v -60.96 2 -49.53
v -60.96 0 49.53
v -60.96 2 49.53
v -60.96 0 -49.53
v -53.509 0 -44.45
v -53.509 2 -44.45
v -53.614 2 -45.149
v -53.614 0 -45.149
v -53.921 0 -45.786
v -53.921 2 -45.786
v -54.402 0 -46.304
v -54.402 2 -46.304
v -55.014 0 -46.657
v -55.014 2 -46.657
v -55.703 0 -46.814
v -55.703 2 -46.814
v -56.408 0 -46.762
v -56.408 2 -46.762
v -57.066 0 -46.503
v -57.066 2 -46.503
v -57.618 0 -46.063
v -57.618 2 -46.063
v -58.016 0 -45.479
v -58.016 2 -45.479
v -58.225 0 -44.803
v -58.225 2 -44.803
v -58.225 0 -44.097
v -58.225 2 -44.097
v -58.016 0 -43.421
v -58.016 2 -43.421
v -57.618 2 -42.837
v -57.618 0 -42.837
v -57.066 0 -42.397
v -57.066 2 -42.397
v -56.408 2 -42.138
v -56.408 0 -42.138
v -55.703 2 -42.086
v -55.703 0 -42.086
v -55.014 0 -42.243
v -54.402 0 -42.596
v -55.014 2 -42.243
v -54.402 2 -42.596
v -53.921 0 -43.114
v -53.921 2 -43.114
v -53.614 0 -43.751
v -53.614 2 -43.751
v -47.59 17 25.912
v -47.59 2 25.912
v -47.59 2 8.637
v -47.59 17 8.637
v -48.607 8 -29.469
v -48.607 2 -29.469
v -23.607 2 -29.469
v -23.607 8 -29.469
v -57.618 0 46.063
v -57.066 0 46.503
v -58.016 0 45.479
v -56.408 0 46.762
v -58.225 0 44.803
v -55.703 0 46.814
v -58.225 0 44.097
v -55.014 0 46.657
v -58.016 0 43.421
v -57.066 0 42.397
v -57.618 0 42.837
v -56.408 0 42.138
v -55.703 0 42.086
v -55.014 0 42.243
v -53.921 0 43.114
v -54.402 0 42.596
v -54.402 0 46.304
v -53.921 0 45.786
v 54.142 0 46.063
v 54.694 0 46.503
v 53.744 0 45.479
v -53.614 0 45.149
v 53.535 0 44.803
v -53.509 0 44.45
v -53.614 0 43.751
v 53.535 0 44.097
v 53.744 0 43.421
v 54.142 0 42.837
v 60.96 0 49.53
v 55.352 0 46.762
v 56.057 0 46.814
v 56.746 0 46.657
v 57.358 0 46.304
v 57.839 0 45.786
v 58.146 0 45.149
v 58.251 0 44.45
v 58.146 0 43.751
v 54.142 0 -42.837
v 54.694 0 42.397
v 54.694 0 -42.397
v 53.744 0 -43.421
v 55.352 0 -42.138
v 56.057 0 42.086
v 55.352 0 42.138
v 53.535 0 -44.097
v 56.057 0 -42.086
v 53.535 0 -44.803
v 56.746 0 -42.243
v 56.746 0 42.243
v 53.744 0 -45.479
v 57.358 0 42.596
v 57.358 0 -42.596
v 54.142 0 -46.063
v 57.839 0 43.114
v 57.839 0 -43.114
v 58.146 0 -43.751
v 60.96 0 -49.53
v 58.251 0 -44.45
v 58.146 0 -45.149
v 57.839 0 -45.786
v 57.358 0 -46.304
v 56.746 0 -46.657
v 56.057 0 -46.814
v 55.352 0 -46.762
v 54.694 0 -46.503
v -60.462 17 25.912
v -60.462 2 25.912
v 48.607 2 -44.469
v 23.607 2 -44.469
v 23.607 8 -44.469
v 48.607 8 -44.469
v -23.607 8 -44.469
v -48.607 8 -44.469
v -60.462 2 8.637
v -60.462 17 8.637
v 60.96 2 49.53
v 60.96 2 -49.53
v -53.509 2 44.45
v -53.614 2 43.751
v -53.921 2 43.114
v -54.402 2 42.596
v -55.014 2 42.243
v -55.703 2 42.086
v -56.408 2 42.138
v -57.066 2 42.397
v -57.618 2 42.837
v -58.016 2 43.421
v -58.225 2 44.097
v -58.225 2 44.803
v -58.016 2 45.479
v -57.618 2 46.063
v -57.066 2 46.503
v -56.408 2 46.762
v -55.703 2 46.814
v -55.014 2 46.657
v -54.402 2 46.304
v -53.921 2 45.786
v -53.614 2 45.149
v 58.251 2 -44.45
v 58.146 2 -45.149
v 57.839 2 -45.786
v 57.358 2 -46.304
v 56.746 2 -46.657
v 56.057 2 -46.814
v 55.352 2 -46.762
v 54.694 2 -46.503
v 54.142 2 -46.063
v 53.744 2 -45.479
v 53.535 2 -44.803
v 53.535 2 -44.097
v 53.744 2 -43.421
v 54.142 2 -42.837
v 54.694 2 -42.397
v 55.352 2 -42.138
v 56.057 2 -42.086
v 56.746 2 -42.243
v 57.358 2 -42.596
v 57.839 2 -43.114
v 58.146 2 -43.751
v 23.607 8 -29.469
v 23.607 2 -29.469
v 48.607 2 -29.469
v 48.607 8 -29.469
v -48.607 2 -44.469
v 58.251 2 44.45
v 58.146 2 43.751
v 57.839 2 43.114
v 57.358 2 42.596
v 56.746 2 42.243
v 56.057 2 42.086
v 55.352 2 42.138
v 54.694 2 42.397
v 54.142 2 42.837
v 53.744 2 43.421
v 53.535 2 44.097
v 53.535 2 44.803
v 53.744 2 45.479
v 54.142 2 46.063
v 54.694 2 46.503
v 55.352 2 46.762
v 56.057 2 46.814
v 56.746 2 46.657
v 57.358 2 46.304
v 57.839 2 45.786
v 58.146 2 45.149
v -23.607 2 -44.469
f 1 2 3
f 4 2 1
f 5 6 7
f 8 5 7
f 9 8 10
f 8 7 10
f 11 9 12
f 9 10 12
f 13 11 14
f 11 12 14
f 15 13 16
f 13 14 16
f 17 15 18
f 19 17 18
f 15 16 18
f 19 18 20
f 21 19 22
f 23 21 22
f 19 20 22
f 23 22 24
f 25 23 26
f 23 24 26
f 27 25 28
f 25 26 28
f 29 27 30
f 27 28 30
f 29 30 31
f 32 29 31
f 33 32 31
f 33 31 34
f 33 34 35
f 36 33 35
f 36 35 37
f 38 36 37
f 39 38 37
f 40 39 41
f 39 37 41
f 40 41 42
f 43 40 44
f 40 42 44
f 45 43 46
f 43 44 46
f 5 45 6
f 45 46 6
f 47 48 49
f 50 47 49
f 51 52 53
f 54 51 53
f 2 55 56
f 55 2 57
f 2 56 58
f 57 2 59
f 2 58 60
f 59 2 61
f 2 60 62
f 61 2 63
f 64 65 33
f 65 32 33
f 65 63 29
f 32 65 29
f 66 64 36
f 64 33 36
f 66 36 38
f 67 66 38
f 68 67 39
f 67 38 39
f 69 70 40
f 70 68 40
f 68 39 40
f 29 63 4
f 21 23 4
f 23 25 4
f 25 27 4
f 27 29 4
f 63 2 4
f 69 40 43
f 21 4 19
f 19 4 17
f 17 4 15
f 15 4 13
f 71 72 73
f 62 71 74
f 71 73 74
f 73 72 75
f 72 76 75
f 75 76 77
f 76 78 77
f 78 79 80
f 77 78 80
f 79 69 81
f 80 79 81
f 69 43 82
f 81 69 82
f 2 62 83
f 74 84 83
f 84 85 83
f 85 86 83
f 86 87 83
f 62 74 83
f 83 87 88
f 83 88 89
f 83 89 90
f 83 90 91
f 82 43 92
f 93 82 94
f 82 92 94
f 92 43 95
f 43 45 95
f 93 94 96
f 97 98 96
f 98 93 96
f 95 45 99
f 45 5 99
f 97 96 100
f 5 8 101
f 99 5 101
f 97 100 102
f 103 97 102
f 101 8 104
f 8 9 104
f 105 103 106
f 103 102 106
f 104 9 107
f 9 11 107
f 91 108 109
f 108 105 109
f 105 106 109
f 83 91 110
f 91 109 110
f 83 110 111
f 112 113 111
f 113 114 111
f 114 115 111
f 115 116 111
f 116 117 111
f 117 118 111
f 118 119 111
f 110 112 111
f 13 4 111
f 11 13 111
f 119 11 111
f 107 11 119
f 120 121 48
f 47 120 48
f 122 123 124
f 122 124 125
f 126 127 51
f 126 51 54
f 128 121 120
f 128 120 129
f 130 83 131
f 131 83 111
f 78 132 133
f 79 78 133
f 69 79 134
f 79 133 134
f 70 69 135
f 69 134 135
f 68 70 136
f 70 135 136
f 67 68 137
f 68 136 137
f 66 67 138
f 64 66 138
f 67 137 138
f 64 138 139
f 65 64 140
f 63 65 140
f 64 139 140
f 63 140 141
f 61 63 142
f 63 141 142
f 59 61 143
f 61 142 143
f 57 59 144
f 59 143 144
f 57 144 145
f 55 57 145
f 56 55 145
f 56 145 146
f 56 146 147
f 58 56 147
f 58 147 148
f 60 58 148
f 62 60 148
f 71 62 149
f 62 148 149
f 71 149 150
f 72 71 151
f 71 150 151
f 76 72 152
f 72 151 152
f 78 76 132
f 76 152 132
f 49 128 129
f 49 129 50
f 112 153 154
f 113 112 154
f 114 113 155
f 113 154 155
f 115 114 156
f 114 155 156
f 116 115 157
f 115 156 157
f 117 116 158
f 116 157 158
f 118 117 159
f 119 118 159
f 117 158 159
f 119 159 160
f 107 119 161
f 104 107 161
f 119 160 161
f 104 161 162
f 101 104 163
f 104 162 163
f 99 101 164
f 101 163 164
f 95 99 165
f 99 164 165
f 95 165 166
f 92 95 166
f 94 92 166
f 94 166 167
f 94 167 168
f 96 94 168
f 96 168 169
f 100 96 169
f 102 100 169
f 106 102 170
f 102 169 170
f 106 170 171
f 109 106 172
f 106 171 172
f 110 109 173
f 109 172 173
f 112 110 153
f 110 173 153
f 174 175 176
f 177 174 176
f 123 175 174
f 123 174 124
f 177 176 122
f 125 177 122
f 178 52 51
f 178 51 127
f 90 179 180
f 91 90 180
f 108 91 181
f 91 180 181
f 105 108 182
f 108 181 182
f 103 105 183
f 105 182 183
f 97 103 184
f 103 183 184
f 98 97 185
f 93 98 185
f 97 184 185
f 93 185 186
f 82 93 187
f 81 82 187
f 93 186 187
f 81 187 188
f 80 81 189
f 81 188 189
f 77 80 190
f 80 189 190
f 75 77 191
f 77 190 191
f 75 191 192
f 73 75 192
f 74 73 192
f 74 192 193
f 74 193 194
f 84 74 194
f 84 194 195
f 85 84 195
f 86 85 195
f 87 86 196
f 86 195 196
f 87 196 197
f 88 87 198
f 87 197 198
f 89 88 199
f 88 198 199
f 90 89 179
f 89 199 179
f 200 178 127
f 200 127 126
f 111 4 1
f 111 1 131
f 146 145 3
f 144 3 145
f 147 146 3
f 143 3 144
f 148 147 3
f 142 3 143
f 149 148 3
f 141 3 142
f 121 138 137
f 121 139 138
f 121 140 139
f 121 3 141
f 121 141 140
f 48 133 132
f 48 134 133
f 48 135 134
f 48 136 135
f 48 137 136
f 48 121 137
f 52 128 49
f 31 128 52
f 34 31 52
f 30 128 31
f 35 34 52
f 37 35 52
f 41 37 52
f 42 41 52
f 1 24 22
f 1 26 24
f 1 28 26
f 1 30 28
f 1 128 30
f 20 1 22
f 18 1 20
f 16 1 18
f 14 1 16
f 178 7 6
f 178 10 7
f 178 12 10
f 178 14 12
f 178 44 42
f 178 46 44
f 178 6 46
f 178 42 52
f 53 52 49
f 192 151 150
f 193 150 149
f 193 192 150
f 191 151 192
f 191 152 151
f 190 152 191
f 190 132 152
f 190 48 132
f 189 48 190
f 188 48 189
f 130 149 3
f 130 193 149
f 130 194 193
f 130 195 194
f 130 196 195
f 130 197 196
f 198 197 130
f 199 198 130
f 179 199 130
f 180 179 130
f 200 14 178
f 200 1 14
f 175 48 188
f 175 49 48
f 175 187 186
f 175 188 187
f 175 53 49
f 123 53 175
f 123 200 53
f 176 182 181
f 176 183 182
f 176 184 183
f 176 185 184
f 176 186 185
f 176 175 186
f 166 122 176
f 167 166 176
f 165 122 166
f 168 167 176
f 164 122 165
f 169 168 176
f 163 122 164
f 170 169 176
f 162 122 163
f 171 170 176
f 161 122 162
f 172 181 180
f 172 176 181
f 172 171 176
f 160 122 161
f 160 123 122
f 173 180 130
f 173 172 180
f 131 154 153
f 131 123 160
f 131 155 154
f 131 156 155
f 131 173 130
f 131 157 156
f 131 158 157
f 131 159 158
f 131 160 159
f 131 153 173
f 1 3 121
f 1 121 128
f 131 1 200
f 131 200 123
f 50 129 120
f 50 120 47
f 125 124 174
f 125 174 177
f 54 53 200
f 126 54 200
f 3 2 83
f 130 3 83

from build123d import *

# Parameters (mm, degrees)
SKETCH1_W           = 121.92
SKETCH1_H           = 99.06
BOSS_EXTRUDE1_DEPTH = 2
SKETCH2_R           = 2.371054243
CUT_EXTRUDE1_DEPTH  = 2
SKETCH3_W           = 25
SKETCH3_H           = 15
BOSS_EXTRUDE2_DEPTH = 6
SKETCH4_W           = 12.871437318
SKETCH4_H           = 17.274823769
BOSS_EXTRUDE3_DEPTH = 15


with BuildPart() as part:
    # Sketch1 → Boss-Extrude1 (new body)
    with BuildSketch(Plane(origin=(0, 0, 0), x_dir=(1, 0, 0), z_dir=(0, 1, 0))):
        Rectangle(SKETCH1_W, SKETCH1_H)
    extrude(amount=BOSS_EXTRUDE1_DEPTH)

    # Sketch2 → Cut-Extrude1 (cut)
    with BuildSketch(Plane(origin=(0, 2, 0), x_dir=(1, 0, 0), z_dir=(0, 1, 0))):
        with Locations((-55.88, 44.45)):
            Circle(SKETCH2_R)
        with Locations((55.88, 44.45)):
            Circle(SKETCH2_R)
        with Locations((55.88, -44.45)):
            Circle(SKETCH2_R)
        with Locations((-55.88, -44.45)):
            Circle(SKETCH2_R)
    extrude(amount=-CUT_EXTRUDE1_DEPTH, mode=Mode.SUBTRACT)

    # Sketch3 → Boss-Extrude2 (add)
    with BuildSketch(Plane(origin=(0, 2, 0), x_dir=(1, 0, 0), z_dir=(0, 1, 0))):
        with Locations((-36.106611978, 36.968817018)):
            Rectangle(SKETCH3_W, SKETCH3_H)
        with Locations((36.106611978, 36.968817018)):
            Rectangle(SKETCH3_W, SKETCH3_H)
    extrude(amount=BOSS_EXTRUDE2_DEPTH)

    # Sketch4 → Boss-Extrude3 (add)
    with BuildSketch(Plane(origin=(0, 2, 0), x_dir=(1, 0, 0), z_dir=(0, 1, 0))):
        with Locations((-54.026164533, -17.274823769)):
            Rectangle(SKETCH4_W, SKETCH4_H)
    extrude(amount=BOSS_EXTRUDE3_DEPTH)


solid = part.part
